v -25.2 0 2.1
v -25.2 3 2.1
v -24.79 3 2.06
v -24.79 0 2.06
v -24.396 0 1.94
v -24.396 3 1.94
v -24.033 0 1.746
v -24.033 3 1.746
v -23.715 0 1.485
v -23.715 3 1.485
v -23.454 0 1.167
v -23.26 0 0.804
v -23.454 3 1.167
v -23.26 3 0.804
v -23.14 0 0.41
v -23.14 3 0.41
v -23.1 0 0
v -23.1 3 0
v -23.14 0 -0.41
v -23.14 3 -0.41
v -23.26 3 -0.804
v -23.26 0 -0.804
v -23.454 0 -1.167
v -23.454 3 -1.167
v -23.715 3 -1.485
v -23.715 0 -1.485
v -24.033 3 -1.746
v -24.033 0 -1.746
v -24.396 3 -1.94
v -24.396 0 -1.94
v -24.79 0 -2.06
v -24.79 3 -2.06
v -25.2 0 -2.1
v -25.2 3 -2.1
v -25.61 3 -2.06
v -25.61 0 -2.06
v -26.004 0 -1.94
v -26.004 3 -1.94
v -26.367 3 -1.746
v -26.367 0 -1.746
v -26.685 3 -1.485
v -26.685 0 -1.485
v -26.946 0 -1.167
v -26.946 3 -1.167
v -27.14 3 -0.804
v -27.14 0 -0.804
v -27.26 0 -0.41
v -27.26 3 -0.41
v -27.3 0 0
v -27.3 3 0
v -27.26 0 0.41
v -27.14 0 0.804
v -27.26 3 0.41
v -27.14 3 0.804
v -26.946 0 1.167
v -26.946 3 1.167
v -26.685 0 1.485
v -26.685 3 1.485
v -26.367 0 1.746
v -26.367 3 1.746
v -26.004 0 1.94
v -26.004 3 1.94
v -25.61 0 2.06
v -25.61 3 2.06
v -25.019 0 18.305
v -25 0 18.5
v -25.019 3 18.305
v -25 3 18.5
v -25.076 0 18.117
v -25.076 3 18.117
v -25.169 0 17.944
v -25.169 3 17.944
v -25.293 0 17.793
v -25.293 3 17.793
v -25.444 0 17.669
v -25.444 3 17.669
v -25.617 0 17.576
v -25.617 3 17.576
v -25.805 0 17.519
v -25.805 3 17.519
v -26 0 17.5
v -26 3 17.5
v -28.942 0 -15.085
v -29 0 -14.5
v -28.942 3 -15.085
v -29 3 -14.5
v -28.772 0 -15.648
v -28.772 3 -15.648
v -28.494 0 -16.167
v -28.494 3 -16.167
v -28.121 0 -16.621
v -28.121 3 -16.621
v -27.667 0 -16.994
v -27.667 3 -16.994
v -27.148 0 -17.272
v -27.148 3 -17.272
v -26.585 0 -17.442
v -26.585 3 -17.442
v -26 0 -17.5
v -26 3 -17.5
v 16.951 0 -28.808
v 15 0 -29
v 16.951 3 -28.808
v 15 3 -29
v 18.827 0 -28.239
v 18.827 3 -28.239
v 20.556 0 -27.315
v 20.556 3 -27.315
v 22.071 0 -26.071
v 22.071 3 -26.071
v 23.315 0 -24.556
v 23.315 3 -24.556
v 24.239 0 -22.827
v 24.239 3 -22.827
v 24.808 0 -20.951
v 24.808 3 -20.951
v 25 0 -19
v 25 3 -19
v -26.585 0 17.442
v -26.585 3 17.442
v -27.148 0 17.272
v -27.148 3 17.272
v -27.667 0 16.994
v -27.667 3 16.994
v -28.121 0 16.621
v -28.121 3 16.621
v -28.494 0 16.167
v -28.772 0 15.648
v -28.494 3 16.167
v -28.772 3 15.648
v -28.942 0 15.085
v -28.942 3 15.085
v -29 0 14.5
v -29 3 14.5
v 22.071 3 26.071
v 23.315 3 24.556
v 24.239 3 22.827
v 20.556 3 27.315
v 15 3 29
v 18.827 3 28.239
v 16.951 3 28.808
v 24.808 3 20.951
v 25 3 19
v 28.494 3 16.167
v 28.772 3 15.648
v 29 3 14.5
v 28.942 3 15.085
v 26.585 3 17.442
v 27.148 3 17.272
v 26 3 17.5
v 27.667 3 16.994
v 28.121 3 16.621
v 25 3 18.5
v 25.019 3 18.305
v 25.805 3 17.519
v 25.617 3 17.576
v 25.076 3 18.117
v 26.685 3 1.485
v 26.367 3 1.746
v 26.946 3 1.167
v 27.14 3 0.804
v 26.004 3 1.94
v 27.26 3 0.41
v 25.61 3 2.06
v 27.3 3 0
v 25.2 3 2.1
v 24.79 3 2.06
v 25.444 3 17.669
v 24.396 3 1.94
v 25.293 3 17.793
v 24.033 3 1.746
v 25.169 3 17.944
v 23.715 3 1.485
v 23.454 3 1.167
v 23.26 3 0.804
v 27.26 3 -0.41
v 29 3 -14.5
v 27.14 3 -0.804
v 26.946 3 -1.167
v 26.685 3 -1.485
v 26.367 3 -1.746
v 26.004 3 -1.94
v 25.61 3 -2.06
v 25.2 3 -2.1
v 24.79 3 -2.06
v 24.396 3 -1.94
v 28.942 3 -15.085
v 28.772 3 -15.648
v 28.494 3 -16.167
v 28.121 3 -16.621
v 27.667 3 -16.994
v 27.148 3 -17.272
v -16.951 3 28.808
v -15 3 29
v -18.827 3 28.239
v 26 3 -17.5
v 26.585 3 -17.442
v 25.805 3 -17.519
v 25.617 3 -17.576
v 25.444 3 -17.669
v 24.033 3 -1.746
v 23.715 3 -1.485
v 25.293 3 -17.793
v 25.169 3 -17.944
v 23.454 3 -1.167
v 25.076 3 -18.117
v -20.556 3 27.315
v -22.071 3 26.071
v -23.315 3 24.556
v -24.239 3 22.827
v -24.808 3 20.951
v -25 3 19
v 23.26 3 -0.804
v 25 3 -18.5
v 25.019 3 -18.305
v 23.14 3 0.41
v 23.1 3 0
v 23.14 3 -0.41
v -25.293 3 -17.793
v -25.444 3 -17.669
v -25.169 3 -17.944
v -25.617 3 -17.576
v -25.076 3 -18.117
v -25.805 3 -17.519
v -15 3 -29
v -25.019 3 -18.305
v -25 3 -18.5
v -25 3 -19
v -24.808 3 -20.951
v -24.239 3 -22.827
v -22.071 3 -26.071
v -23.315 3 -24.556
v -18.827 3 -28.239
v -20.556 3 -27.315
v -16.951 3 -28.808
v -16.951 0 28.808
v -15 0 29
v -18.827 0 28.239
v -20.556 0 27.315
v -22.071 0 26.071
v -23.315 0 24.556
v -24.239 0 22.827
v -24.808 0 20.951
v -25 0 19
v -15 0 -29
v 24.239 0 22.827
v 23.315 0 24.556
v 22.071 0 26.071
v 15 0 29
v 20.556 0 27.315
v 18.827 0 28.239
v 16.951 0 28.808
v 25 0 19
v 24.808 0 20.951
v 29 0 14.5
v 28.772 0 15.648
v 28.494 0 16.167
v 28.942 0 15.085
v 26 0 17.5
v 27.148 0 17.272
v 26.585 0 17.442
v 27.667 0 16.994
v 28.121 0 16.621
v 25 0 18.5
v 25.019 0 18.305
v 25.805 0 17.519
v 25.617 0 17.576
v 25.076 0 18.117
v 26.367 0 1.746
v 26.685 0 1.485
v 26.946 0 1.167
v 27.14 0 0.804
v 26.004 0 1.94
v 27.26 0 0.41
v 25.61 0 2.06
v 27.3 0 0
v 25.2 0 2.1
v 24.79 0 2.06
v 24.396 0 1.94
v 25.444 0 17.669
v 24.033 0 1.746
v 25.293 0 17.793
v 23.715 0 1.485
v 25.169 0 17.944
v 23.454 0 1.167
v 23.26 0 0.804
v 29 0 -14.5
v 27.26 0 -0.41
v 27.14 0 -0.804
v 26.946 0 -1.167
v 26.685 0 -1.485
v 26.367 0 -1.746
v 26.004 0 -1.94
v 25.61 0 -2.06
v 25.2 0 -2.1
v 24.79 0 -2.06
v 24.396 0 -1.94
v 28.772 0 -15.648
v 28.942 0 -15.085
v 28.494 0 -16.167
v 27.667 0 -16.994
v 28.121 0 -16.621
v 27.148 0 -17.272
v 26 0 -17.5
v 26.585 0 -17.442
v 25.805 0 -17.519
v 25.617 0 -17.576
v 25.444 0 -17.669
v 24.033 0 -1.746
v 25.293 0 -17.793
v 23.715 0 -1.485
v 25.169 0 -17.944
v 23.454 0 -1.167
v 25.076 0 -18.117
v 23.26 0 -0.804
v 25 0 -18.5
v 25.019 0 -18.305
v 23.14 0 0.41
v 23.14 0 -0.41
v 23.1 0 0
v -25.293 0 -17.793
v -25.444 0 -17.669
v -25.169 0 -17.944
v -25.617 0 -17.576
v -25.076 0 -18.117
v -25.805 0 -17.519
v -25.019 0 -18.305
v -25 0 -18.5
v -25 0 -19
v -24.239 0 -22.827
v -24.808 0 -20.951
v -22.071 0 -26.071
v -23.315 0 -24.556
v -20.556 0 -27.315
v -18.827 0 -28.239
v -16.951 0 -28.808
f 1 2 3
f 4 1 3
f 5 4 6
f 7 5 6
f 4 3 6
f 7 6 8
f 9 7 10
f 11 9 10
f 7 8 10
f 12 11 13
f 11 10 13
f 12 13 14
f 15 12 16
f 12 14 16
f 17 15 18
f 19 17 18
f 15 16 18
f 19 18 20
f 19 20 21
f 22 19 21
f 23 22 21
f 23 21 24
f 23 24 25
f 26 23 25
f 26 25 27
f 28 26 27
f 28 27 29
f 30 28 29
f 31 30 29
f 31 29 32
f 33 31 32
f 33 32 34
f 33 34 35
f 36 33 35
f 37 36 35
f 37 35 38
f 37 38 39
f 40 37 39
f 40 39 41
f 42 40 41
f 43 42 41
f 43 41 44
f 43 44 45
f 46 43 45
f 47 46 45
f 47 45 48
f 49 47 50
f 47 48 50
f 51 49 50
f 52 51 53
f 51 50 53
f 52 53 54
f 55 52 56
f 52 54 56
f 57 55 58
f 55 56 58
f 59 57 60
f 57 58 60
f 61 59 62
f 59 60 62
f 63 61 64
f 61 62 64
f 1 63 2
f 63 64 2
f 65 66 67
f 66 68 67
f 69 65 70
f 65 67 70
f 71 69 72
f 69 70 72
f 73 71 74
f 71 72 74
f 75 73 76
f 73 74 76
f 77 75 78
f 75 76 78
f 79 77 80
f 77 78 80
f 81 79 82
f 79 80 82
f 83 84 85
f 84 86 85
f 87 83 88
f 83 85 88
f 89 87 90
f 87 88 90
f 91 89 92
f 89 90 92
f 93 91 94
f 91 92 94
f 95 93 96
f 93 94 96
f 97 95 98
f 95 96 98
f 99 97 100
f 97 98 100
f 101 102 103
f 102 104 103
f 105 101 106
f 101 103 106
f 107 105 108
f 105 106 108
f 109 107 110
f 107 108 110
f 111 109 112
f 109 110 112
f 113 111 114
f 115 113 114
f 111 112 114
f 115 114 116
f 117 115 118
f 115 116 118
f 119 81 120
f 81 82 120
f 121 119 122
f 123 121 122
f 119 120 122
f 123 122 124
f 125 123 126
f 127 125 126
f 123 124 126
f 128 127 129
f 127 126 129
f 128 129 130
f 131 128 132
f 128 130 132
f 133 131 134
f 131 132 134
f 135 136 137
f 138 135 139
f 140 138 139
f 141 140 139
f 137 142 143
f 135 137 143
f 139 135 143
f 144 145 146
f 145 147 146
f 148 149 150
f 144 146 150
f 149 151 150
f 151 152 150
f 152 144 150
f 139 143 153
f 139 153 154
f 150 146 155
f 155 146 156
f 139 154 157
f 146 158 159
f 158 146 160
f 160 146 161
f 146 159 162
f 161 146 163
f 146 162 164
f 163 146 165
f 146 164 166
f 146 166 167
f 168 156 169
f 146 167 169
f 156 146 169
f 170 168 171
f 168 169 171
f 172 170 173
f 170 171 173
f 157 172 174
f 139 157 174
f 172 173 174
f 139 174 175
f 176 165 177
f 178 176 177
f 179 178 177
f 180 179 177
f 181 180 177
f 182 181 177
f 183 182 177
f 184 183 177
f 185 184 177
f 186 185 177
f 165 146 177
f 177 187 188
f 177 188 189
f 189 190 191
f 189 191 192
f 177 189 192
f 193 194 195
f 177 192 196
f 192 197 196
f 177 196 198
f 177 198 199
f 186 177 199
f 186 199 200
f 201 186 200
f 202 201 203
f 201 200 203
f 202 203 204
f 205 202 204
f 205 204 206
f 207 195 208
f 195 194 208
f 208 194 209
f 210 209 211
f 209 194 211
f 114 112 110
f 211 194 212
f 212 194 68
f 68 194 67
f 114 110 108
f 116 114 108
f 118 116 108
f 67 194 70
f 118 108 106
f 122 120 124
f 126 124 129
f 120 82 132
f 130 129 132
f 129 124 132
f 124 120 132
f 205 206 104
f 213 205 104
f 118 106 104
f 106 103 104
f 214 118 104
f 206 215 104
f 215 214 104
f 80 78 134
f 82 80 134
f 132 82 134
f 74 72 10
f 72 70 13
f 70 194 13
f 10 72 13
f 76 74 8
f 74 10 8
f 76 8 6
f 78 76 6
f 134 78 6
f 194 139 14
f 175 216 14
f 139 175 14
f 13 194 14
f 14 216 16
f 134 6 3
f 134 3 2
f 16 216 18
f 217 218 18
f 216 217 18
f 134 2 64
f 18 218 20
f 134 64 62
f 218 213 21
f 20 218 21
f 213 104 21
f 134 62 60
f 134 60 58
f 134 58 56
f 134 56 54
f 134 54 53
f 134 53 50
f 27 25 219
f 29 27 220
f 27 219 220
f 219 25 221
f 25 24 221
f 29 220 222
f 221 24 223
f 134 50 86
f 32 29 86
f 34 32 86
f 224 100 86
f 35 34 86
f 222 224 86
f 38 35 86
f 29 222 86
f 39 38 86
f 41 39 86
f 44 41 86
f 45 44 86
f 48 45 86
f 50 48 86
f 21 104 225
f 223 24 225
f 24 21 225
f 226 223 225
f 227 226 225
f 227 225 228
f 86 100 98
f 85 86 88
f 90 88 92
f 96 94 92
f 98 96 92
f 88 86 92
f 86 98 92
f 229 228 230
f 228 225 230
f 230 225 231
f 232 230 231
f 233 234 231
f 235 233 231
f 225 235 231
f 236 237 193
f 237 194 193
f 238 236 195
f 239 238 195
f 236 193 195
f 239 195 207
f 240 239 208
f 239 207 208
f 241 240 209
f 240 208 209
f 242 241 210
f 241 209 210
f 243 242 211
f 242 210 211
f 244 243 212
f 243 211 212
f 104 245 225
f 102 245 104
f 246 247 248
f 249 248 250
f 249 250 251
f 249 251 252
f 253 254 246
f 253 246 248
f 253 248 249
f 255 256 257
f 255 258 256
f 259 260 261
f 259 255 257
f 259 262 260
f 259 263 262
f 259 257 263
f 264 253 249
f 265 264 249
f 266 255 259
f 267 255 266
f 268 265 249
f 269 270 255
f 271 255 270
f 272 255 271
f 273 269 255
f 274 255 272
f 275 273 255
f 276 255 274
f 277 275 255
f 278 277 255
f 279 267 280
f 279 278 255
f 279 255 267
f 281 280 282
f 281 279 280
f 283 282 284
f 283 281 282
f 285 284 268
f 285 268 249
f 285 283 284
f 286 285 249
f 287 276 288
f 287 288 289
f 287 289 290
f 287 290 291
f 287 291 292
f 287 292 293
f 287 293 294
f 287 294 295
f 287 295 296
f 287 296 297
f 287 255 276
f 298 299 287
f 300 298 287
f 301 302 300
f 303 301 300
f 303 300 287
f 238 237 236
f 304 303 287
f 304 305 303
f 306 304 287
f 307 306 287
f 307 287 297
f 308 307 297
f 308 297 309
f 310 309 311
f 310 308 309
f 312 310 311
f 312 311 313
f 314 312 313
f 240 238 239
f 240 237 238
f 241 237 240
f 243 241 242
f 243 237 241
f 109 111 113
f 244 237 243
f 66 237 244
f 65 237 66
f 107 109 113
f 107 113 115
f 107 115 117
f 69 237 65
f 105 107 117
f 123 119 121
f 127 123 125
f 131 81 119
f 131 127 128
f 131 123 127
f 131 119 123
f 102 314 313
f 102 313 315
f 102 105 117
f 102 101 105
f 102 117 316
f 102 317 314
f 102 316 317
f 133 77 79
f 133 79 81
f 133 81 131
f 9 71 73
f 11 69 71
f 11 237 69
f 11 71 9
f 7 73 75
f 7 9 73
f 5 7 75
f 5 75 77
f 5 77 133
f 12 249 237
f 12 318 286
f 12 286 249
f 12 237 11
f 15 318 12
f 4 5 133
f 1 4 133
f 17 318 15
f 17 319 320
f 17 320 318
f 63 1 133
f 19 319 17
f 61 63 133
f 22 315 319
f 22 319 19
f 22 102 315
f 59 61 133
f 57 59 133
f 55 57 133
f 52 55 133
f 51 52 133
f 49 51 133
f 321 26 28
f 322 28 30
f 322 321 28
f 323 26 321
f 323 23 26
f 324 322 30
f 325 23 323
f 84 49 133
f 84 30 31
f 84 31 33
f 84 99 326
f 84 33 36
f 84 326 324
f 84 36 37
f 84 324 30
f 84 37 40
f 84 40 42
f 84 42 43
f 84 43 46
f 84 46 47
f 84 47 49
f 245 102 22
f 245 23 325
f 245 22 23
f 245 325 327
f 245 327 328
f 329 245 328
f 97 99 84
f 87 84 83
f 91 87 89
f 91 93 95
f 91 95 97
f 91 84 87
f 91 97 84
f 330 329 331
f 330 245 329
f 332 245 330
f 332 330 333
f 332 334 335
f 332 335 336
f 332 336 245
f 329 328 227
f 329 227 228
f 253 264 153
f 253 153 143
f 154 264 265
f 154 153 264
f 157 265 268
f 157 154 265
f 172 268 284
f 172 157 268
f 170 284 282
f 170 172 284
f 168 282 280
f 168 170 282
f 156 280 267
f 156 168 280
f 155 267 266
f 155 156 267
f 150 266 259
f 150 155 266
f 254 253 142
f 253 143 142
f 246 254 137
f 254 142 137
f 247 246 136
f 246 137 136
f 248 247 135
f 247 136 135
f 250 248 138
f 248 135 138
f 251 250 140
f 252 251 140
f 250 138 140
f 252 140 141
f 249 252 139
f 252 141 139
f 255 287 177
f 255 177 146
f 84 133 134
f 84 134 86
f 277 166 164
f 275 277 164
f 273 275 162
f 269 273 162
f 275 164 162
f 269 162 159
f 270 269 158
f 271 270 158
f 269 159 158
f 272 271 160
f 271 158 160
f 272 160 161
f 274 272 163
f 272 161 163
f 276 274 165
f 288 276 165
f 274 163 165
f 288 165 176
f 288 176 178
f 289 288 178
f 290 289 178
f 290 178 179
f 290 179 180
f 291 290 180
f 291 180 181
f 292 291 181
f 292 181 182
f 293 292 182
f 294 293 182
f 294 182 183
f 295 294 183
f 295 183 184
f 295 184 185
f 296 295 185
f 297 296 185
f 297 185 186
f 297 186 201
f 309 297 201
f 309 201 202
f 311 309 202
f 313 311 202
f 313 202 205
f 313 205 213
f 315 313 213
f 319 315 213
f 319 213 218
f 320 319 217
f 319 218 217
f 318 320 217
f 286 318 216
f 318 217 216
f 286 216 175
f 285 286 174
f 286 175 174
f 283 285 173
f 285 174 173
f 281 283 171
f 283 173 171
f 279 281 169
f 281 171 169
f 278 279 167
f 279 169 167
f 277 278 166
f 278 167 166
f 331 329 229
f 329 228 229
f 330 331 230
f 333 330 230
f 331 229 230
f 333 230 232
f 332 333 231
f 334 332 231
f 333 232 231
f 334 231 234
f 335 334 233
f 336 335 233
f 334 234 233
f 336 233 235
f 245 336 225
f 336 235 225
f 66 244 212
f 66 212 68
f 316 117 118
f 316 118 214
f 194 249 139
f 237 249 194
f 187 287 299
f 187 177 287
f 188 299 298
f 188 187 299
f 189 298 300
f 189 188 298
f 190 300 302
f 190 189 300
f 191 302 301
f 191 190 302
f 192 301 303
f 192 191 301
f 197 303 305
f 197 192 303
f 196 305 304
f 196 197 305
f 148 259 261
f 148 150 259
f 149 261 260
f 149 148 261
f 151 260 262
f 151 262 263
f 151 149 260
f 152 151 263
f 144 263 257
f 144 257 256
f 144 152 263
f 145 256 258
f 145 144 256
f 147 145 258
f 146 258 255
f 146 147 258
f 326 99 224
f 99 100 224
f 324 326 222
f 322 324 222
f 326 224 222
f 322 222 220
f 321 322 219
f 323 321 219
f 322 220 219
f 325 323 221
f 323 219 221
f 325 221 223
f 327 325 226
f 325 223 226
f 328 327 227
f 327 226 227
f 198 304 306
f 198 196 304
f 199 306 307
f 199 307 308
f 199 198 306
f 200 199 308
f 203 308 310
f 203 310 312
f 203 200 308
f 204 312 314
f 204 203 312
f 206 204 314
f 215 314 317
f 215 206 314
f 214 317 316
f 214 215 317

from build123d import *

# Parameters (mm, degrees)
BOSS_EXTRUDE1_DEPTH = 3
FILLET1_R           = 10
FILLET2_R           = 1
FILLET3_R           = 3
SKETCH2_R           = 2.1
CUT_EXTRUDE1_DEPTH  = 42.12177039


with BuildPart() as part:
    # Sketch1 → Boss-Extrude1 (new body)
    with BuildSketch(Plane(origin=(0, 0, 0), x_dir=(1, 0, 0), z_dir=(0, 1, 0))):
        Polygon((29, -17.5), (25, -17.5), (25, -29), (-25, -29), (-25, -17.5), (-29, -17.5), (-29, 17.5), (-25, 17.5), (-25, 29), (25, 29), (25, 17.5), (29, 17.5), align=None)
    extrude(amount=BOSS_EXTRUDE1_DEPTH)

    # Fillet1
    fillet1_edges = [part.edges().sort_by_distance(p)[0] for p in [
        (25, 1.5, 29),
        (-25, 1.5, 29),
        (-25, 1.5, -29),
        (25, 1.5, -29),
    ]]
    fillet(fillet1_edges, radius=FILLET1_R)

    # Fillet2
    fillet2_edges = [part.edges().sort_by_distance(p)[0] for p in [
        (25, 1.5, 17.5),
        (-25, 1.5, 17.5),
        (-25, 1.5, -17.5),
        (25, 1.5, -17.5),
    ]]
    fillet(fillet2_edges, radius=FILLET2_R)

    # Fillet3
    fillet3_edges = [part.edges().sort_by_distance(p)[0] for p in [
        (29, 1.5, 17.5),
        (29, 1.5, -17.5),
        (-29, 1.5, 17.5),
        (-29, 1.5, -17.5),
    ]]
    fillet(fillet3_edges, radius=FILLET3_R - 0.0001)  # a hair under: the kernel refuses the full size

    # Sketch2 → Cut-Extrude1 (cut, through all)
    with BuildSketch(Plane(origin=(0, 3, 0), x_dir=(1, 0, 0), z_dir=(0, 1, 0))):
        with Locations(Location((-25.2, 0, 0), (0, 0, 270))):
            Circle(SKETCH2_R)
        with Locations(Location((25.2, 0, 0), (0, 0, 270))):
            Circle(SKETCH2_R)
    extrude(amount=-CUT_EXTRUDE1_DEPTH, mode=Mode.SUBTRACT)


solid = part.part
